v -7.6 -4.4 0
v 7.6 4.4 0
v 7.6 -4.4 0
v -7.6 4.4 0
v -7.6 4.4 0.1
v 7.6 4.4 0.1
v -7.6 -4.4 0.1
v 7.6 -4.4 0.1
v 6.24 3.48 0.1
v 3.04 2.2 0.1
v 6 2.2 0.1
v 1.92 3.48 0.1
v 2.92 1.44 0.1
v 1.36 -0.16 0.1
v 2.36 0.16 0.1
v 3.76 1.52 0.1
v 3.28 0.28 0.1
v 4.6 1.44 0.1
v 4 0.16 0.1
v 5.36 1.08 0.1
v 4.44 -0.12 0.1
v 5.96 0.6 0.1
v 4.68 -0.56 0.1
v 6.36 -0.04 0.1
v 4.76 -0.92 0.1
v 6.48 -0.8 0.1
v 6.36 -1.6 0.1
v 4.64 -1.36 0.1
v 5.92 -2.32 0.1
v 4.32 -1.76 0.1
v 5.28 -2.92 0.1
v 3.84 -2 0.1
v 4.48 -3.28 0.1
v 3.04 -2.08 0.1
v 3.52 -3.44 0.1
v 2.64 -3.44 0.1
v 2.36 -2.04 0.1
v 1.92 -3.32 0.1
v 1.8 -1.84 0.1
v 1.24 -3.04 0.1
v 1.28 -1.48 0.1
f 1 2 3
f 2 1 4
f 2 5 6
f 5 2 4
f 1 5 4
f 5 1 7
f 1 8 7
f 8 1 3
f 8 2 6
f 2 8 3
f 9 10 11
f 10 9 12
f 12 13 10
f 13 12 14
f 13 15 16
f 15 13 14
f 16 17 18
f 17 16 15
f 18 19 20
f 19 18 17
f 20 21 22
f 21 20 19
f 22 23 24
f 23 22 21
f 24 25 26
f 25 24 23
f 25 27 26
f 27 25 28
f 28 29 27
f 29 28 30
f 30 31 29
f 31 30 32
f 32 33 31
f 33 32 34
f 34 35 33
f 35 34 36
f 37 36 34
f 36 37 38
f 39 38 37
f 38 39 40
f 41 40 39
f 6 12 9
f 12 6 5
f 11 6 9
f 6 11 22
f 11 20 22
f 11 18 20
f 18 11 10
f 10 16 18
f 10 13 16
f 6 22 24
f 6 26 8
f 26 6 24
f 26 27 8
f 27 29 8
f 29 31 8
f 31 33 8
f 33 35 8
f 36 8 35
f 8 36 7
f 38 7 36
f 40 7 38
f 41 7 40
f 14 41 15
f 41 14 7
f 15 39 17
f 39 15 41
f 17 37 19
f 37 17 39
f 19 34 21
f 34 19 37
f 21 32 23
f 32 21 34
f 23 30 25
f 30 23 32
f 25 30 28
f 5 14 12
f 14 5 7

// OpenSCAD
// file: ../p/box5-12.scad
use <../lib.scad>
function ldraw_lib__box5_12() = [
// 0 Box with 5 Faces without Any Edges
// 0 Name: box5-12.dat
// 0 Author: Chris Dee [cwdee]
// 0 !LDRAW_ORG Primitive UPDATE 2009-02
// 0 !LICENSE Licensed under CC BY 4.0 : see CAreadme.txt
// 
// 0 BFC CERTIFY CCW
  [0,"BFC","CERTIFY"],
  [0,"BFC","CCW"],
// 
// 0 !HISTORY 2009-09-03 [PTadmin] Official Update 2009-02
// 
// 
// 4 16 1 1 1 1 1 -1 -1 1 -1 -1 1 1
  [4,16,1,1,1,1,1,-1,-1,1,-1,-1,1,1],
// 4 16 -1 0 1 1 0 1 1 1 1 -1 1 1
  [4,16,-1,0,1,1,0,1,1,1,1,-1,1,1],
// 4 16 -1 0 -1 -1 0 1 -1 1 1 -1 1 -1
  [4,16,-1,0,-1,-1,0,1,-1,1,1,-1,1,-1],
// 4 16 1 0 -1 -1 0 -1 -1 1 -1 1 1 -1
  [4,16,1,0,-1,-1,0,-1,-1,1,-1,1,1,-1],
// 4 16 1 0 1 1 0 -1 1 1 -1 1 1 1
  [4,16,1,0,1,1,0,-1,1,1,-1,1,1,1],
// 0
];
module ldraw_lib__box5_12(step=0, col=false, unit=2/5, alt=false, line=0.2, solid=!$preview)
    makepoly(ldraw_lib__box5_12(), step=step, col=col, unit=unit, alt=alt, line=line, solid=solid);
ldraw_lib__box5_12(line=0.2);
// main file
use <../lib.scad>
use <../p/box5-12.scad>
function ldraw_lib__168055c() = [
// 0 Sticker  1.1 x  1.9 with Right White Number Five on Blue Background
// 0 Name: 168055c.dat
// 0 Author: Takeshi Takahashi [RainbowDolphin]
// 0 !LDRAW_ORG Part UPDATE 2024-03
// 0 !LICENSE Licensed under CC BY 4.0 : see CAreadme.txt
// 
// 0 BFC CERTIFY CCW
  [0,"BFC","CERTIFY"],
  [0,"BFC","CCW"],
// 
// 0 !KEYWORDS Formula 1, race car, Renault, Set 1750
// 
// 0 !HISTORY 2024-04-28 [OrionP] Official Update 2024-03
// 
// 
// 1 16 0 -0.25 0 19 0 0 0 0.25 0 0 0 11 box5-12.dat
  [1,16,0,-0.25,0,19,0,0,0,0.25,0,0,0,11, ldraw_lib__box5_12()],
// 4 15 15 -0.25 5.5 15.6 -0.25 8.7 4.8 -0.25 8.7 7.6 -0.25 5.5
  [4,15,15,-0.25,5.5,15.6,-0.25,8.7,4.8,-0.25,8.7,7.6,-0.25,5.5],
// 4 15 7.3 -0.25 3.6 7.6 -0.25 5.5 4.8 -0.25 8.7 3.4 -0.25 -0.4
  [4,15,7.3,-0.25,3.6,7.6,-0.25,5.5,4.8,-0.25,8.7,3.4,-0.25,-0.4],
// 4 15 7.3 -0.25 3.6 3.4 -0.25 -0.4 5.9 -0.25 0.4 9.4 -0.25 3.8
  [4,15,7.3,-0.25,3.6,3.4,-0.25,-0.4,5.9,-0.25,0.4,9.4,-0.25,3.8],
// 4 15 9.4 -0.25 3.8 5.9 -0.25 0.4 8.2 -0.25 0.7 11.5 -0.25 3.6
  [4,15,9.4,-0.25,3.8,5.9,-0.25,0.4,8.2,-0.25,0.7,11.5,-0.25,3.6],
// 4 15 11.5 -0.25 3.6 8.2 -0.25 0.7 10 -0.25 0.4 13.4 -0.25 2.7
  [4,15,11.5,-0.25,3.6,8.2,-0.25,0.7,10,-0.25,0.4,13.4,-0.25,2.7],
// 4 15 13.4 -0.25 2.7 10 -0.25 0.4 11.1 -0.25 -0.3 14.9 -0.25 1.5
  [4,15,13.4,-0.25,2.7,10,-0.25,0.4,11.1,-0.25,-0.3,14.9,-0.25,1.5],
// 4 15 14.9 -0.25 1.5 11.1 -0.25 -0.3 11.7 -0.25 -1.4 15.9 -0.25 -0.1
  [4,15,14.9,-0.25,1.5,11.1,-0.25,-0.3,11.7,-0.25,-1.4,15.9,-0.25,-0.1],
// 4 15 15.9 -0.25 -0.1 11.7 -0.25 -1.4 11.9 -0.25 -2.3 16.2 -0.25 -2
  [4,15,15.9,-0.25,-0.1,11.7,-0.25,-1.4,11.9,-0.25,-2.3,16.2,-0.25,-2],
// 4 15 16.2 -0.25 -2 11.9 -0.25 -2.3 11.6 -0.25 -3.4 15.9 -0.25 -4
  [4,15,16.2,-0.25,-2,11.9,-0.25,-2.3,11.6,-0.25,-3.4,15.9,-0.25,-4],
// 4 15 14.8 -0.25 -5.8 15.9 -0.25 -4 11.6 -0.25 -3.4 10.8 -0.25 -4.4
  [4,15,14.8,-0.25,-5.8,15.9,-0.25,-4,11.6,-0.25,-3.4,10.8,-0.25,-4.4],
// 4 15 13.2 -0.25 -7.3 14.8 -0.25 -5.8 10.8 -0.25 -4.4 9.6 -0.25 -5
  [4,15,13.2,-0.25,-7.3,14.8,-0.25,-5.8,10.8,-0.25,-4.4,9.6,-0.25,-5],
// 4 15 11.2 -0.25 -8.2 13.2 -0.25 -7.3 9.6 -0.25 -5 7.6 -0.25 -5.2
  [4,15,11.2,-0.25,-8.2,13.2,-0.25,-7.3,9.6,-0.25,-5,7.6,-0.25,-5.2],
// 4 15 8.8 -0.25 -8.6 11.2 -0.25 -8.2 7.6 -0.25 -5.2 6.6 -0.25 -8.6
  [4,15,8.8,-0.25,-8.6,11.2,-0.25,-8.2,7.6,-0.25,-5.2,6.6,-0.25,-8.6],
// 4 15 6.6 -0.25 -8.6 7.6 -0.25 -5.2 5.9 -0.25 -5.1 4.8 -0.25 -8.3
  [4,15,6.6,-0.25,-8.6,7.6,-0.25,-5.2,5.9,-0.25,-5.1,4.8,-0.25,-8.3],
// 4 15 4.8 -0.25 -8.3 5.9 -0.25 -5.1 4.5 -0.25 -4.6 3.1 -0.25 -7.6
  [4,15,4.8,-0.25,-8.3,5.9,-0.25,-5.1,4.5,-0.25,-4.6,3.1,-0.25,-7.6],
// 3 15 3.2 -0.25 -3.7 3.1 -0.25 -7.6 4.5 -0.25 -4.6
  [3,15,3.2,-0.25,-3.7,3.1,-0.25,-7.6,4.5,-0.25,-4.6],
// 4 1 15.6 -0.25 8.7 19 -0.25 11 -19 -0.25 11 4.8 -0.25 8.7
  [4,1,15.6,-0.25,8.7,19,-0.25,11,-19,-0.25,11,4.8,-0.25,8.7],
// 4 1 19 -0.25 11 15.6 -0.25 8.7 15 -0.25 5.5 14.9 -0.25 1.5
  [4,1,19,-0.25,11,15.6,-0.25,8.7,15,-0.25,5.5,14.9,-0.25,1.5],
// 3 1 15 -0.25 5.5 13.4 -0.25 2.7 14.9 -0.25 1.5
  [3,1,15,-0.25,5.5,13.4,-0.25,2.7,14.9,-0.25,1.5],
// 4 1 11.5 -0.25 3.6 13.4 -0.25 2.7 15 -0.25 5.5 7.6 -0.25 5.5
  [4,1,11.5,-0.25,3.6,13.4,-0.25,2.7,15,-0.25,5.5,7.6,-0.25,5.5],
// 3 1 7.6 -0.25 5.5 9.4 -0.25 3.8 11.5 -0.25 3.6
  [3,1,7.6,-0.25,5.5,9.4,-0.25,3.8,11.5,-0.25,3.6],
// 3 1 7.6 -0.25 5.5 7.3 -0.25 3.6 9.4 -0.25 3.8
  [3,1,7.6,-0.25,5.5,7.3,-0.25,3.6,9.4,-0.25,3.8],
// 3 1 19 -0.25 11 14.9 -0.25 1.5 15.9 -0.25 -0.1
  [3,1,19,-0.25,11,14.9,-0.25,1.5,15.9,-0.25,-0.1],
// 4 1 19 -0.25 11 15.9 -0.25 -0.1 16.2 -0.25 -2 19 -0.25 -11
  [4,1,19,-0.25,11,15.9,-0.25,-0.1,16.2,-0.25,-2,19,-0.25,-11],
// 3 1 16.2 -0.25 -2 15.9 -0.25 -4 19 -0.25 -11
  [3,1,16.2,-0.25,-2,15.9,-0.25,-4,19,-0.25,-11],
// 3 1 15.9 -0.25 -4 14.8 -0.25 -5.8 19 -0.25 -11
  [3,1,15.9,-0.25,-4,14.8,-0.25,-5.8,19,-0.25,-11],
// 3 1 14.8 -0.25 -5.8 13.2 -0.25 -7.3 19 -0.25 -11
  [3,1,14.8,-0.25,-5.8,13.2,-0.25,-7.3,19,-0.25,-11],
// 3 1 13.2 -0.25 -7.3 11.2 -0.25 -8.2 19 -0.25 -11
  [3,1,13.2,-0.25,-7.3,11.2,-0.25,-8.2,19,-0.25,-11],
// 3 1 11.2 -0.25 -8.2 8.8 -0.25 -8.6 19 -0.25 -11
  [3,1,11.2,-0.25,-8.2,8.8,-0.25,-8.6,19,-0.25,-11],
// 4 1 -19 -0.25 -11 19 -0.25 -11 8.8 -0.25 -8.6 6.6 -0.25 -8.6
  [4,1,-19,-0.25,-11,19,-0.25,-11,8.8,-0.25,-8.6,6.6,-0.25,-8.6],
// 3 1 4.8 -0.25 -8.3 -19 -0.25 -11 6.6 -0.25 -8.6
  [3,1,4.8,-0.25,-8.3,-19,-0.25,-11,6.6,-0.25,-8.6],
// 3 1 3.1 -0.25 -7.6 -19 -0.25 -11 4.8 -0.25 -8.3
  [3,1,3.1,-0.25,-7.6,-19,-0.25,-11,4.8,-0.25,-8.3],
// 3 1 3.2 -0.25 -3.7 -19 -0.25 -11 3.1 -0.25 -7.6
  [3,1,3.2,-0.25,-3.7,-19,-0.25,-11,3.1,-0.25,-7.6],
// 4 1 3.4 -0.25 -0.4 -19 -0.25 -11 3.2 -0.25 -3.7 5.9 -0.25 0.4
  [4,1,3.4,-0.25,-0.4,-19,-0.25,-11,3.2,-0.25,-3.7,5.9,-0.25,0.4],
// 4 1 5.9 -0.25 0.4 3.2 -0.25 -3.7 4.5 -0.25 -4.6 8.2 -0.25 0.7
  [4,1,5.9,-0.25,0.4,3.2,-0.25,-3.7,4.5,-0.25,-4.6,8.2,-0.25,0.7],
// 4 1 8.2 -0.25 0.7 4.5 -0.25 -4.6 5.9 -0.25 -5.1 10 -0.25 0.4
  [4,1,8.2,-0.25,0.7,4.5,-0.25,-4.6,5.9,-0.25,-5.1,10,-0.25,0.4],
// 4 1 10 -0.25 0.4 5.9 -0.25 -5.1 7.6 -0.25 -5.2 11.1 -0.25 -0.3
  [4,1,10,-0.25,0.4,5.9,-0.25,-5.1,7.6,-0.25,-5.2,11.1,-0.25,-0.3],
// 4 1 11.1 -0.25 -0.3 7.6 -0.25 -5.2 9.6 -0.25 -5 11.7 -0.25 -1.4
  [4,1,11.1,-0.25,-0.3,7.6,-0.25,-5.2,9.6,-0.25,-5,11.7,-0.25,-1.4],
// 4 1 11.7 -0.25 -1.4 9.6 -0.25 -5 10.8 -0.25 -4.4 11.9 -0.25 -2.3
  [4,1,11.7,-0.25,-1.4,9.6,-0.25,-5,10.8,-0.25,-4.4,11.9,-0.25,-2.3],
// 3 1 11.9 -0.25 -2.3 10.8 -0.25 -4.4 11.6 -0.25 -3.4
  [3,1,11.9,-0.25,-2.3,10.8,-0.25,-4.4,11.6,-0.25,-3.4],
// 4 1 -19 -0.25 11 -19 -0.25 -11 3.4 -0.25 -0.4 4.8 -0.25 8.7
  [4,1,-19,-0.25,11,-19,-0.25,-11,3.4,-0.25,-0.4,4.8,-0.25,8.7],
];
module ldraw_lib__168055c(step=0, col=false, unit=2/5, alt=false, line=0.2, solid=!$preview)
    makepoly(ldraw_lib__168055c(), step=step, col=col, unit=unit, alt=alt, line=line, solid=solid);
ldraw_lib__168055c(line=0.2);
